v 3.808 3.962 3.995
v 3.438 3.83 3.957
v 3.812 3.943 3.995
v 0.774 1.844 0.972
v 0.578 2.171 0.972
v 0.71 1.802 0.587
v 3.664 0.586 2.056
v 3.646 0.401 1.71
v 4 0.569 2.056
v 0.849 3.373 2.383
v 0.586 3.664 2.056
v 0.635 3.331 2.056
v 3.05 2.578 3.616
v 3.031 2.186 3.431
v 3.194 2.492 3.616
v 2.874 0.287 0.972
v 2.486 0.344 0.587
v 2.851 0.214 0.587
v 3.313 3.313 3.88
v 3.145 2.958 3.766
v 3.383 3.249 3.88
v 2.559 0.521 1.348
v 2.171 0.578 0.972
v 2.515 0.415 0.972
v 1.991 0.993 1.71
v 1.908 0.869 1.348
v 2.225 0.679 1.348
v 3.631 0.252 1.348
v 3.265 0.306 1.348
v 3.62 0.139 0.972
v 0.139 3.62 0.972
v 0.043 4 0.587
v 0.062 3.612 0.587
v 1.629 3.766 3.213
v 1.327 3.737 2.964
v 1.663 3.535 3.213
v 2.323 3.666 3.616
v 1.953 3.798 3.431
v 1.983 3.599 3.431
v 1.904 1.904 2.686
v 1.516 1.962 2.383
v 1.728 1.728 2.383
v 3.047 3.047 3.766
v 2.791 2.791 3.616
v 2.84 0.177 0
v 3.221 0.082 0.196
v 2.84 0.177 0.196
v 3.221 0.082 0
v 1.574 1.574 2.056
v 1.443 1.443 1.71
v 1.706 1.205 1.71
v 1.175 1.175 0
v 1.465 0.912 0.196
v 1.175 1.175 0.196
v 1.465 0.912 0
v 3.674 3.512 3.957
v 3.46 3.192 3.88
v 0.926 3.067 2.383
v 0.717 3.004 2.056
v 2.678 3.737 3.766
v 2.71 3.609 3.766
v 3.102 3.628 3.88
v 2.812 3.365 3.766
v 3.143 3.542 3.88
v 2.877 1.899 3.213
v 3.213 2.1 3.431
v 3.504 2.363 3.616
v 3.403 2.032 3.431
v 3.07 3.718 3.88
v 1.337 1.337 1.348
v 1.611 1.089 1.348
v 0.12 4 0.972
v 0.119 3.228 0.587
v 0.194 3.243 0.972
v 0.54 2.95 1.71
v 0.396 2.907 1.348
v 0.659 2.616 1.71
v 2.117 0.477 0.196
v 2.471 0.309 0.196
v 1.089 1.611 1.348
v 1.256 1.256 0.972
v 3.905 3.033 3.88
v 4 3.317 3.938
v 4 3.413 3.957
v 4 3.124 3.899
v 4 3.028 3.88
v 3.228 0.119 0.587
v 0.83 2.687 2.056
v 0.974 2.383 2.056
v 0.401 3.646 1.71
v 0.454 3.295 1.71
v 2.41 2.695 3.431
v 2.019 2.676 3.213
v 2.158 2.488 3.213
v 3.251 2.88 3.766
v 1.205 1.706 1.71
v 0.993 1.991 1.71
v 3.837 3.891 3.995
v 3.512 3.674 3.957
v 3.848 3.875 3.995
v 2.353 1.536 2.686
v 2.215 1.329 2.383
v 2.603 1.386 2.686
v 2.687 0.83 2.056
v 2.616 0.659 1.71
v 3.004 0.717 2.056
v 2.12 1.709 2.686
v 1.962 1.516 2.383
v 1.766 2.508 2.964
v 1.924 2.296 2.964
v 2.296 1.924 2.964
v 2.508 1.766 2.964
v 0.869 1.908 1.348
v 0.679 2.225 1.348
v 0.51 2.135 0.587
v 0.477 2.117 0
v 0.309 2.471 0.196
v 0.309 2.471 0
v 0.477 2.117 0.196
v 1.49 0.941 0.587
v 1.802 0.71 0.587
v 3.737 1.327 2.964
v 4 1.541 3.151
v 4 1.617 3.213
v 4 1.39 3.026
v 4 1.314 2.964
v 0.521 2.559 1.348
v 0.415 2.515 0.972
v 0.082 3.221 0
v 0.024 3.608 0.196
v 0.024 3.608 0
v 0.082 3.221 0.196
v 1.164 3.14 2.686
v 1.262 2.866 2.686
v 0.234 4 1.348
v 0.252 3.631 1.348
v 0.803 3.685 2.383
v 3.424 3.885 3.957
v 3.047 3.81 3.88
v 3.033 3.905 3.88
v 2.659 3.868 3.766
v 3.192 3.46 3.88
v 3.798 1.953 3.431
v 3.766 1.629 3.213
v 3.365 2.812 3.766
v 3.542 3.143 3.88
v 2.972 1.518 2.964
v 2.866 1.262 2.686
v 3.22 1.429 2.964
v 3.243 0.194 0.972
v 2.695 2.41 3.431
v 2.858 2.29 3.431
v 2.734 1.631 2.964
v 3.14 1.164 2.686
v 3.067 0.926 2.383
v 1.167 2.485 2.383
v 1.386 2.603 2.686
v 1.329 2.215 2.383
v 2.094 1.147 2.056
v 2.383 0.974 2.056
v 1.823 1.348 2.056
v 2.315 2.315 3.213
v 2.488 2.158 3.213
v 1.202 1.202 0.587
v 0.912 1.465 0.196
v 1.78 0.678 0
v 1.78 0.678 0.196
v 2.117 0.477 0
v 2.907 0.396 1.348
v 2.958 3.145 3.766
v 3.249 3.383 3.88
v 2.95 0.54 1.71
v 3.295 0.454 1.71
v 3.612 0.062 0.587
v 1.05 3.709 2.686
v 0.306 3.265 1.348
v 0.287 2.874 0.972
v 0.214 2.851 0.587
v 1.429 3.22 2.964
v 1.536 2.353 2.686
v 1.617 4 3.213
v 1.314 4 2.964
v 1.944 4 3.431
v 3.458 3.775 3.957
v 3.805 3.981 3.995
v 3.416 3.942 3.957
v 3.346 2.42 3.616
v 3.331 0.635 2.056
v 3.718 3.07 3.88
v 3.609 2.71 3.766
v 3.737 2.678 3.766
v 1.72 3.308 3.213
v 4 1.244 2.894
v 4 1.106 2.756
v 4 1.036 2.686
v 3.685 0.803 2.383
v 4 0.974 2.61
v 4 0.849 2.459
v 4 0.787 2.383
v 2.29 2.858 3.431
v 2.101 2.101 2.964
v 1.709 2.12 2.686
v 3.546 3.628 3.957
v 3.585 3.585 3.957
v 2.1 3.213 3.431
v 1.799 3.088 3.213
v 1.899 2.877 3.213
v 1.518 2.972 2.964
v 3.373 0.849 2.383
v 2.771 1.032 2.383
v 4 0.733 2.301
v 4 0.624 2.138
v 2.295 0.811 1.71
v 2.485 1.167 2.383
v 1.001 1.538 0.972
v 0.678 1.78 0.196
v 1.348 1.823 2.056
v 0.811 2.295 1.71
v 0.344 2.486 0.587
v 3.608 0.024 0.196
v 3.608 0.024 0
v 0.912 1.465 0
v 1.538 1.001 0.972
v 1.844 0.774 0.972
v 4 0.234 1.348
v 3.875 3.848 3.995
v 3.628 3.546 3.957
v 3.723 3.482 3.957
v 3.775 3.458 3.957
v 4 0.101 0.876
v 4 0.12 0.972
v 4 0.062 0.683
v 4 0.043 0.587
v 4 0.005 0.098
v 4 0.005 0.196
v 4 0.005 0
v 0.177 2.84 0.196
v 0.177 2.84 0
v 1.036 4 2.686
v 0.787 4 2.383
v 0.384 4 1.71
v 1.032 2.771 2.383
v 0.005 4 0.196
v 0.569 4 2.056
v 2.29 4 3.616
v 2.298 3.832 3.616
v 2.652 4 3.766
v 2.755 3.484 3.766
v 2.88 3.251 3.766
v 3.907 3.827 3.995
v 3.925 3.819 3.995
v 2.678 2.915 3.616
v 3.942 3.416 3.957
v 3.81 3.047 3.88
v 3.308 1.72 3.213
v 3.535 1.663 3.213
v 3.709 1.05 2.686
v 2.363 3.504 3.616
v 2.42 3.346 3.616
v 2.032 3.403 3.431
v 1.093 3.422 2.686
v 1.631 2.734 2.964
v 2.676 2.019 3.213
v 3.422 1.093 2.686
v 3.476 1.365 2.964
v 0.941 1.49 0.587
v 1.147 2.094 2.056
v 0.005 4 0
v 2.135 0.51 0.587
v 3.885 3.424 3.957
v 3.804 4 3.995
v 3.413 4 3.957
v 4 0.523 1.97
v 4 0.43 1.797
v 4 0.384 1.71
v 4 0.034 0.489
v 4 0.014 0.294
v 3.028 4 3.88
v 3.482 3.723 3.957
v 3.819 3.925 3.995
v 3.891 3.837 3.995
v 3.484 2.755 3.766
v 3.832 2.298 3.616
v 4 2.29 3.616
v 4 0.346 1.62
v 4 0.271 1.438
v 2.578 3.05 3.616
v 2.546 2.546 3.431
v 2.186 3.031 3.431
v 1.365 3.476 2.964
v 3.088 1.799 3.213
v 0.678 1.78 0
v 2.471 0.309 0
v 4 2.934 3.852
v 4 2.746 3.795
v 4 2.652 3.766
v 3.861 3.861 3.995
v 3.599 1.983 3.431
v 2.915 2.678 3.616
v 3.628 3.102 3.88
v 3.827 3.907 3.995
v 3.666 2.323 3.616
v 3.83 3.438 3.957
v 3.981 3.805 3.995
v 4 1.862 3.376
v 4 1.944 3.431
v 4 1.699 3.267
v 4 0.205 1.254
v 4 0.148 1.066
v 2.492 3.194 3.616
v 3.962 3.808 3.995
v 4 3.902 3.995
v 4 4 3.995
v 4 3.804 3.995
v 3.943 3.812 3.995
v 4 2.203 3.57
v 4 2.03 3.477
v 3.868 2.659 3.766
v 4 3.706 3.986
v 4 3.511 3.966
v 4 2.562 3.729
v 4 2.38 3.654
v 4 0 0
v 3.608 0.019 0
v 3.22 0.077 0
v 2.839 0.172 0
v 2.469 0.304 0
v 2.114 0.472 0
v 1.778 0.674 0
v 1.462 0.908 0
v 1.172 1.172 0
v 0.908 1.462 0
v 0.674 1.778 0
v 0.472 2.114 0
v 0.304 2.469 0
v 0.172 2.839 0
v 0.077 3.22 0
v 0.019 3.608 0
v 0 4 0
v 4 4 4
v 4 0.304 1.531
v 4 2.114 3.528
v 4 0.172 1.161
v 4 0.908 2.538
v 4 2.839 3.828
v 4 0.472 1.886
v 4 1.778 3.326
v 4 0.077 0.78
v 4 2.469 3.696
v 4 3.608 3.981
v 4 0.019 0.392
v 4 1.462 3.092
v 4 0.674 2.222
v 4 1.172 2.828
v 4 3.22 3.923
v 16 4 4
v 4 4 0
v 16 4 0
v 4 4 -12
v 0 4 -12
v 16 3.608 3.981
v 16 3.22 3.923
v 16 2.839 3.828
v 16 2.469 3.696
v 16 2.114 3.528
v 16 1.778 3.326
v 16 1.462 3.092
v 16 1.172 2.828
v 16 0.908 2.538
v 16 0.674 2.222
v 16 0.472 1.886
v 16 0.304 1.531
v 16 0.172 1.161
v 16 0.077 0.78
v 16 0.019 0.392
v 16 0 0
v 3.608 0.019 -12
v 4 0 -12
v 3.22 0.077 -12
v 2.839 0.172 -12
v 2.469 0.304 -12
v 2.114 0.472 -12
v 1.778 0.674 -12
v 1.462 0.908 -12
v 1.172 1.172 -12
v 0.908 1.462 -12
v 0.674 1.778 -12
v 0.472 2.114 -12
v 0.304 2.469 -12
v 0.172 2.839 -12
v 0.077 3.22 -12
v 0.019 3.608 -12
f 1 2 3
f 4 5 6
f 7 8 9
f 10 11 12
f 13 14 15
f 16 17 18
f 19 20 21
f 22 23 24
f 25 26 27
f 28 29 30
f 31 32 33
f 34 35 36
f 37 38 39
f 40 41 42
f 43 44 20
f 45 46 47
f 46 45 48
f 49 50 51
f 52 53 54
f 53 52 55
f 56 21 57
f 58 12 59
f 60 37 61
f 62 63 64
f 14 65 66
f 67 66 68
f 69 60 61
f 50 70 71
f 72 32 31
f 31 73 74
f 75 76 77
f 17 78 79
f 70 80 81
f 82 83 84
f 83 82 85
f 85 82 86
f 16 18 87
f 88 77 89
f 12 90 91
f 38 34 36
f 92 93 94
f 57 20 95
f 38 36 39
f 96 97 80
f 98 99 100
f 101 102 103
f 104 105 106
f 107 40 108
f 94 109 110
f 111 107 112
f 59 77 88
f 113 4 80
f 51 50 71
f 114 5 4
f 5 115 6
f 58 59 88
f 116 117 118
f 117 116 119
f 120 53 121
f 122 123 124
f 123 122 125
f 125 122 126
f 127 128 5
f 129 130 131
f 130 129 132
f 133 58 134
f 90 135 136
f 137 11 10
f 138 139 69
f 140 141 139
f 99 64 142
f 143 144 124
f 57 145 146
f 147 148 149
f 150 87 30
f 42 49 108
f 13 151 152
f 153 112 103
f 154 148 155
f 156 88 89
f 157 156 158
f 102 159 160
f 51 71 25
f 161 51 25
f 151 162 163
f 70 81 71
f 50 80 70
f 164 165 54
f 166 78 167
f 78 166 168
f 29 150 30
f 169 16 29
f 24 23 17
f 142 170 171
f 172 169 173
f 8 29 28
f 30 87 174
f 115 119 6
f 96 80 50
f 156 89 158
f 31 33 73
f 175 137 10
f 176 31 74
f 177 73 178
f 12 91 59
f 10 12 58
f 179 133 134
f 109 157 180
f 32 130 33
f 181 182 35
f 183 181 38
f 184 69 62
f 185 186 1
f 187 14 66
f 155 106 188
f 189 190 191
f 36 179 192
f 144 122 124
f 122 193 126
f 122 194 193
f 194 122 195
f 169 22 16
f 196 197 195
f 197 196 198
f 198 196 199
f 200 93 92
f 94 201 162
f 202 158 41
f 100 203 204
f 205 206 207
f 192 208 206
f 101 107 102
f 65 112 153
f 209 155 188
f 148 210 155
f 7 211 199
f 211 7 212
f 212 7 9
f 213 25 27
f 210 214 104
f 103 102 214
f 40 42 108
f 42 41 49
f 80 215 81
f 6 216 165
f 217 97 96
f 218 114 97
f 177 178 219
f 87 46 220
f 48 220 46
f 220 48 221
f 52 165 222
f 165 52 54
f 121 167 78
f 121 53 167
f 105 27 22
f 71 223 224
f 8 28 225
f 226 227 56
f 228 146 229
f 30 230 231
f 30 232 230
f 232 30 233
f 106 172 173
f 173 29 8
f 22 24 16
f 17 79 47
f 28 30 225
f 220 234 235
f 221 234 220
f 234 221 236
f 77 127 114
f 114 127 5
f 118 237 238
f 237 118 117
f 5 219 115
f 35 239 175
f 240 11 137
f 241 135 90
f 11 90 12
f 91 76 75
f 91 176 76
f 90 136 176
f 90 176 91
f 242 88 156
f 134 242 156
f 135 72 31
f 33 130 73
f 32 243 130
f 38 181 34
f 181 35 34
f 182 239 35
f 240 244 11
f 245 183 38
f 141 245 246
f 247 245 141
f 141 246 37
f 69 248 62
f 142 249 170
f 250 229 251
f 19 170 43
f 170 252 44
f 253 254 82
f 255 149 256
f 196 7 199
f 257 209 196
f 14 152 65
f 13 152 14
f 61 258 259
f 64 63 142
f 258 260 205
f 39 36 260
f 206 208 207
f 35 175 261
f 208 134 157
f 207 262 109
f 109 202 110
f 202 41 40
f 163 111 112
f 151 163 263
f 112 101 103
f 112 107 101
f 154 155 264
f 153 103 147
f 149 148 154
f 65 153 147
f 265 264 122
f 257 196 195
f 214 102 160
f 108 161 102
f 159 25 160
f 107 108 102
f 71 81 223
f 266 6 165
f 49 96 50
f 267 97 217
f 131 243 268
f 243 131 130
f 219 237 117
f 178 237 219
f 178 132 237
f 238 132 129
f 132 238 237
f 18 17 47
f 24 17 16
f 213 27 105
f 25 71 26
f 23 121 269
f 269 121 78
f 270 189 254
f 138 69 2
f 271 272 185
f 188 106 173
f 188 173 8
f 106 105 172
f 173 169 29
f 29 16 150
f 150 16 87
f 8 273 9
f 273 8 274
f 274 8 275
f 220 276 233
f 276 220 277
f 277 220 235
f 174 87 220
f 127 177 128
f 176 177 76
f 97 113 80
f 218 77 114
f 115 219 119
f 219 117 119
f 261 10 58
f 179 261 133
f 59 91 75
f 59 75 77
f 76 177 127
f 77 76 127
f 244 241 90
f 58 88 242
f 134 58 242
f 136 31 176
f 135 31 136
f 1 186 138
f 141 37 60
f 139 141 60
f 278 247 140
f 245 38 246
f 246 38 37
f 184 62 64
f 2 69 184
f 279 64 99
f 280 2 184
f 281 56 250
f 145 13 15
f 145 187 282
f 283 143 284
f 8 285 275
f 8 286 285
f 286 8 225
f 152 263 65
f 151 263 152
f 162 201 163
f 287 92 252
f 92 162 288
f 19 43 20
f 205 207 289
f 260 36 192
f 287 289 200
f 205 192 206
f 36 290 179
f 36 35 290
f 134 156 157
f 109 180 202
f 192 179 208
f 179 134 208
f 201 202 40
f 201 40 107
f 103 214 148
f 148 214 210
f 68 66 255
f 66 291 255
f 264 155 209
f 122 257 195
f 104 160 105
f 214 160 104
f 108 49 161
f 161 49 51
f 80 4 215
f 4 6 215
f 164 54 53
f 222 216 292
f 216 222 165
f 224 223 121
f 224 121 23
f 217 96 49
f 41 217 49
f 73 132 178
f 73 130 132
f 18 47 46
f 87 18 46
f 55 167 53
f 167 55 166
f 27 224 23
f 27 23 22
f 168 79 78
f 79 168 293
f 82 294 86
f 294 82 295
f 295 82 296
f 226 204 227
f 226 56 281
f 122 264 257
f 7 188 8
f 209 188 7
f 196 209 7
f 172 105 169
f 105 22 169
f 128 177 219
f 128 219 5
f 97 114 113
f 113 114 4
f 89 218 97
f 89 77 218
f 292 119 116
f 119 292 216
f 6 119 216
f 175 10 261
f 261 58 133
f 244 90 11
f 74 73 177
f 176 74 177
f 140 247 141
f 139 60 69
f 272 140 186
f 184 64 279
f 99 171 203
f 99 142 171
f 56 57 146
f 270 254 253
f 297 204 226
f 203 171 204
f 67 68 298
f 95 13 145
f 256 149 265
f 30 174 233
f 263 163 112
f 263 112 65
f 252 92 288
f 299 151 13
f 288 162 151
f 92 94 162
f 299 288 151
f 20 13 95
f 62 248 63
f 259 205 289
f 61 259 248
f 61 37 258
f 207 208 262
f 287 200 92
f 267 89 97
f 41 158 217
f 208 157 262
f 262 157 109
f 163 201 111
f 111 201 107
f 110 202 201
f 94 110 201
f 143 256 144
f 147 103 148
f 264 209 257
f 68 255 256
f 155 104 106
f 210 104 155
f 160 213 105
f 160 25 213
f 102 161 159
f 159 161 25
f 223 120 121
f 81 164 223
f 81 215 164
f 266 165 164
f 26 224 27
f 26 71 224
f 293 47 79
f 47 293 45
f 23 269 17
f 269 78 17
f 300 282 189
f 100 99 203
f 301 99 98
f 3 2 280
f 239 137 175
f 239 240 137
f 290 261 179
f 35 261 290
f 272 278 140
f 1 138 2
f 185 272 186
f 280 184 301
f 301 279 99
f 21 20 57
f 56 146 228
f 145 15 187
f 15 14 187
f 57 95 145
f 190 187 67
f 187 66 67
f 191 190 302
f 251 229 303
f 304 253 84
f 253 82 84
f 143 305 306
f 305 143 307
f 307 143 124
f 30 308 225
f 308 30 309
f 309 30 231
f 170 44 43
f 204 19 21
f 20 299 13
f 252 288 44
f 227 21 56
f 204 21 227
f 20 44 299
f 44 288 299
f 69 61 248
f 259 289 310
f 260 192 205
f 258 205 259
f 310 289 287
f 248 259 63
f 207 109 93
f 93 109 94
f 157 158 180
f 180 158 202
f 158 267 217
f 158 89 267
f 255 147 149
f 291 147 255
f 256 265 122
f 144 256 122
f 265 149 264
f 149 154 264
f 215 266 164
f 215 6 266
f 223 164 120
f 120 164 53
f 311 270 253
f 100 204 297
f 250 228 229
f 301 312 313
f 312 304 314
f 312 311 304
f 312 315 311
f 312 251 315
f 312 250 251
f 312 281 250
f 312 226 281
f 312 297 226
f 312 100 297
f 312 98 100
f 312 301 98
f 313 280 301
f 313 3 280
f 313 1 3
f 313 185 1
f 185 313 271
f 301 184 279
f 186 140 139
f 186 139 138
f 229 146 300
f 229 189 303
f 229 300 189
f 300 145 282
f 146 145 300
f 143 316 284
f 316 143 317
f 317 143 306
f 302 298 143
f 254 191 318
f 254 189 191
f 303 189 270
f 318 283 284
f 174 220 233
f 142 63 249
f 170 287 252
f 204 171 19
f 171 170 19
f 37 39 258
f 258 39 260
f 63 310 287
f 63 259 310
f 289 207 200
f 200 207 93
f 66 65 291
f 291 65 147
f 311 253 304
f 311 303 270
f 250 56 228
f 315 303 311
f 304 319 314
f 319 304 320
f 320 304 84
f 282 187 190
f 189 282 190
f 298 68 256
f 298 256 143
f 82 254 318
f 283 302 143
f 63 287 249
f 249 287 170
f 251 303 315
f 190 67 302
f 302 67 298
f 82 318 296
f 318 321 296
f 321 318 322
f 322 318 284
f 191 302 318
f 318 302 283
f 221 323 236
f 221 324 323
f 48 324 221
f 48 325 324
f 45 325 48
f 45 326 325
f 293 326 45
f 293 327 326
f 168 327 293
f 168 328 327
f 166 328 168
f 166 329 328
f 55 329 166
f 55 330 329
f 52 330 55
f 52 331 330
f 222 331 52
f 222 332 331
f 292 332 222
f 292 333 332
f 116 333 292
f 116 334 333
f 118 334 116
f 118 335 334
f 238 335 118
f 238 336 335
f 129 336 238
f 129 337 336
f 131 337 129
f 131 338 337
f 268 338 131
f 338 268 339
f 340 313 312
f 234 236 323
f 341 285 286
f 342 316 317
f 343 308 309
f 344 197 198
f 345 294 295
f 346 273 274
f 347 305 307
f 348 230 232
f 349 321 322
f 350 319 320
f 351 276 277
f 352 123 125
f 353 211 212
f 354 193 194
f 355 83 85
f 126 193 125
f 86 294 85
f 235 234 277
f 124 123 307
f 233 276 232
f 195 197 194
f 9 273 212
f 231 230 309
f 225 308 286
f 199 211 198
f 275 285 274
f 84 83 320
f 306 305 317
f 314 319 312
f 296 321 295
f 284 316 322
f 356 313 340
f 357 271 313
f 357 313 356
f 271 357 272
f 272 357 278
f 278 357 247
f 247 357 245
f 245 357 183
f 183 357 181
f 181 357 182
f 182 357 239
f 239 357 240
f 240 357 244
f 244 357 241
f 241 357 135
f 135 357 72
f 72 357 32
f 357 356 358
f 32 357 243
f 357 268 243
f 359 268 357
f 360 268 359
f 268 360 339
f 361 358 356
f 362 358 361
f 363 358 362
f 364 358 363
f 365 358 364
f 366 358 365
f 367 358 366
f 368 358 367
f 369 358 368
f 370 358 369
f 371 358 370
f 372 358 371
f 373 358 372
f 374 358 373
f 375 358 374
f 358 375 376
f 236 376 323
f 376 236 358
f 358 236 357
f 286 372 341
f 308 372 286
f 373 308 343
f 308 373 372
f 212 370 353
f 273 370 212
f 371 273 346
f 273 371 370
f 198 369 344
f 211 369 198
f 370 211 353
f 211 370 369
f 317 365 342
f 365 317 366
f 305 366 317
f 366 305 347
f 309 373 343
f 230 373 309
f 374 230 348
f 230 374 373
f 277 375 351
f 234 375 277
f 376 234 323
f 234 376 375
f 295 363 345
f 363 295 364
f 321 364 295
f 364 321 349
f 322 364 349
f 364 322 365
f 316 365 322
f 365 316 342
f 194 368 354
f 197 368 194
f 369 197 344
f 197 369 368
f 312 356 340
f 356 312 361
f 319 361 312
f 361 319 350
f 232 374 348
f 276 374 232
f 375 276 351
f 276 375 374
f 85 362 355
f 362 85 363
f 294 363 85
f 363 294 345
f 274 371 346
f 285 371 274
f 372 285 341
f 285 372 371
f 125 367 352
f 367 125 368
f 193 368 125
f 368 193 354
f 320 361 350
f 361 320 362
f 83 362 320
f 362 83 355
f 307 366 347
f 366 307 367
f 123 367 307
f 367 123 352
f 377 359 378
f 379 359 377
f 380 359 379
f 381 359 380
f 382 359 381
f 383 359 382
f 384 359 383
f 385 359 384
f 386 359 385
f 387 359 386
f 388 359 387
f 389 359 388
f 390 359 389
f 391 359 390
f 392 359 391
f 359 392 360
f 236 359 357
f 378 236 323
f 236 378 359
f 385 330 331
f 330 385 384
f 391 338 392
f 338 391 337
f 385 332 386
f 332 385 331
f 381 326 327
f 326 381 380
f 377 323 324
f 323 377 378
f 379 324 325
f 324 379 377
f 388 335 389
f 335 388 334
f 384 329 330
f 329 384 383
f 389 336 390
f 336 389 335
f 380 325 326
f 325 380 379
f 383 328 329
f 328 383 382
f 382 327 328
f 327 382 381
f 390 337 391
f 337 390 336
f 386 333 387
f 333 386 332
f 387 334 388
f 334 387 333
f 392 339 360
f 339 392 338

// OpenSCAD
$fn = 64;

// corner
color("red")
translate([4, 4, 0])
rotate([0, 0, 180])
intersection(){
    sphere(r = 4);
    cube([8, 8, 8]);
}


//edge
color("green")
translate([4, 0, 0])
intersection(){
    cube([12, 4, 4]);
    translate([0, 4, 0])
    rotate([0, 90, 0])
    cylinder(h=12, r=4);
}

translate([4, 4, 0])
rotate([0, 90, 180])
color("pink")
//translate([4, 0, 8])
intersection(){
    cube([12, 4, 4]);
    rotate([0, 90, 0])
    cylinder(h=12, r=4);
}
